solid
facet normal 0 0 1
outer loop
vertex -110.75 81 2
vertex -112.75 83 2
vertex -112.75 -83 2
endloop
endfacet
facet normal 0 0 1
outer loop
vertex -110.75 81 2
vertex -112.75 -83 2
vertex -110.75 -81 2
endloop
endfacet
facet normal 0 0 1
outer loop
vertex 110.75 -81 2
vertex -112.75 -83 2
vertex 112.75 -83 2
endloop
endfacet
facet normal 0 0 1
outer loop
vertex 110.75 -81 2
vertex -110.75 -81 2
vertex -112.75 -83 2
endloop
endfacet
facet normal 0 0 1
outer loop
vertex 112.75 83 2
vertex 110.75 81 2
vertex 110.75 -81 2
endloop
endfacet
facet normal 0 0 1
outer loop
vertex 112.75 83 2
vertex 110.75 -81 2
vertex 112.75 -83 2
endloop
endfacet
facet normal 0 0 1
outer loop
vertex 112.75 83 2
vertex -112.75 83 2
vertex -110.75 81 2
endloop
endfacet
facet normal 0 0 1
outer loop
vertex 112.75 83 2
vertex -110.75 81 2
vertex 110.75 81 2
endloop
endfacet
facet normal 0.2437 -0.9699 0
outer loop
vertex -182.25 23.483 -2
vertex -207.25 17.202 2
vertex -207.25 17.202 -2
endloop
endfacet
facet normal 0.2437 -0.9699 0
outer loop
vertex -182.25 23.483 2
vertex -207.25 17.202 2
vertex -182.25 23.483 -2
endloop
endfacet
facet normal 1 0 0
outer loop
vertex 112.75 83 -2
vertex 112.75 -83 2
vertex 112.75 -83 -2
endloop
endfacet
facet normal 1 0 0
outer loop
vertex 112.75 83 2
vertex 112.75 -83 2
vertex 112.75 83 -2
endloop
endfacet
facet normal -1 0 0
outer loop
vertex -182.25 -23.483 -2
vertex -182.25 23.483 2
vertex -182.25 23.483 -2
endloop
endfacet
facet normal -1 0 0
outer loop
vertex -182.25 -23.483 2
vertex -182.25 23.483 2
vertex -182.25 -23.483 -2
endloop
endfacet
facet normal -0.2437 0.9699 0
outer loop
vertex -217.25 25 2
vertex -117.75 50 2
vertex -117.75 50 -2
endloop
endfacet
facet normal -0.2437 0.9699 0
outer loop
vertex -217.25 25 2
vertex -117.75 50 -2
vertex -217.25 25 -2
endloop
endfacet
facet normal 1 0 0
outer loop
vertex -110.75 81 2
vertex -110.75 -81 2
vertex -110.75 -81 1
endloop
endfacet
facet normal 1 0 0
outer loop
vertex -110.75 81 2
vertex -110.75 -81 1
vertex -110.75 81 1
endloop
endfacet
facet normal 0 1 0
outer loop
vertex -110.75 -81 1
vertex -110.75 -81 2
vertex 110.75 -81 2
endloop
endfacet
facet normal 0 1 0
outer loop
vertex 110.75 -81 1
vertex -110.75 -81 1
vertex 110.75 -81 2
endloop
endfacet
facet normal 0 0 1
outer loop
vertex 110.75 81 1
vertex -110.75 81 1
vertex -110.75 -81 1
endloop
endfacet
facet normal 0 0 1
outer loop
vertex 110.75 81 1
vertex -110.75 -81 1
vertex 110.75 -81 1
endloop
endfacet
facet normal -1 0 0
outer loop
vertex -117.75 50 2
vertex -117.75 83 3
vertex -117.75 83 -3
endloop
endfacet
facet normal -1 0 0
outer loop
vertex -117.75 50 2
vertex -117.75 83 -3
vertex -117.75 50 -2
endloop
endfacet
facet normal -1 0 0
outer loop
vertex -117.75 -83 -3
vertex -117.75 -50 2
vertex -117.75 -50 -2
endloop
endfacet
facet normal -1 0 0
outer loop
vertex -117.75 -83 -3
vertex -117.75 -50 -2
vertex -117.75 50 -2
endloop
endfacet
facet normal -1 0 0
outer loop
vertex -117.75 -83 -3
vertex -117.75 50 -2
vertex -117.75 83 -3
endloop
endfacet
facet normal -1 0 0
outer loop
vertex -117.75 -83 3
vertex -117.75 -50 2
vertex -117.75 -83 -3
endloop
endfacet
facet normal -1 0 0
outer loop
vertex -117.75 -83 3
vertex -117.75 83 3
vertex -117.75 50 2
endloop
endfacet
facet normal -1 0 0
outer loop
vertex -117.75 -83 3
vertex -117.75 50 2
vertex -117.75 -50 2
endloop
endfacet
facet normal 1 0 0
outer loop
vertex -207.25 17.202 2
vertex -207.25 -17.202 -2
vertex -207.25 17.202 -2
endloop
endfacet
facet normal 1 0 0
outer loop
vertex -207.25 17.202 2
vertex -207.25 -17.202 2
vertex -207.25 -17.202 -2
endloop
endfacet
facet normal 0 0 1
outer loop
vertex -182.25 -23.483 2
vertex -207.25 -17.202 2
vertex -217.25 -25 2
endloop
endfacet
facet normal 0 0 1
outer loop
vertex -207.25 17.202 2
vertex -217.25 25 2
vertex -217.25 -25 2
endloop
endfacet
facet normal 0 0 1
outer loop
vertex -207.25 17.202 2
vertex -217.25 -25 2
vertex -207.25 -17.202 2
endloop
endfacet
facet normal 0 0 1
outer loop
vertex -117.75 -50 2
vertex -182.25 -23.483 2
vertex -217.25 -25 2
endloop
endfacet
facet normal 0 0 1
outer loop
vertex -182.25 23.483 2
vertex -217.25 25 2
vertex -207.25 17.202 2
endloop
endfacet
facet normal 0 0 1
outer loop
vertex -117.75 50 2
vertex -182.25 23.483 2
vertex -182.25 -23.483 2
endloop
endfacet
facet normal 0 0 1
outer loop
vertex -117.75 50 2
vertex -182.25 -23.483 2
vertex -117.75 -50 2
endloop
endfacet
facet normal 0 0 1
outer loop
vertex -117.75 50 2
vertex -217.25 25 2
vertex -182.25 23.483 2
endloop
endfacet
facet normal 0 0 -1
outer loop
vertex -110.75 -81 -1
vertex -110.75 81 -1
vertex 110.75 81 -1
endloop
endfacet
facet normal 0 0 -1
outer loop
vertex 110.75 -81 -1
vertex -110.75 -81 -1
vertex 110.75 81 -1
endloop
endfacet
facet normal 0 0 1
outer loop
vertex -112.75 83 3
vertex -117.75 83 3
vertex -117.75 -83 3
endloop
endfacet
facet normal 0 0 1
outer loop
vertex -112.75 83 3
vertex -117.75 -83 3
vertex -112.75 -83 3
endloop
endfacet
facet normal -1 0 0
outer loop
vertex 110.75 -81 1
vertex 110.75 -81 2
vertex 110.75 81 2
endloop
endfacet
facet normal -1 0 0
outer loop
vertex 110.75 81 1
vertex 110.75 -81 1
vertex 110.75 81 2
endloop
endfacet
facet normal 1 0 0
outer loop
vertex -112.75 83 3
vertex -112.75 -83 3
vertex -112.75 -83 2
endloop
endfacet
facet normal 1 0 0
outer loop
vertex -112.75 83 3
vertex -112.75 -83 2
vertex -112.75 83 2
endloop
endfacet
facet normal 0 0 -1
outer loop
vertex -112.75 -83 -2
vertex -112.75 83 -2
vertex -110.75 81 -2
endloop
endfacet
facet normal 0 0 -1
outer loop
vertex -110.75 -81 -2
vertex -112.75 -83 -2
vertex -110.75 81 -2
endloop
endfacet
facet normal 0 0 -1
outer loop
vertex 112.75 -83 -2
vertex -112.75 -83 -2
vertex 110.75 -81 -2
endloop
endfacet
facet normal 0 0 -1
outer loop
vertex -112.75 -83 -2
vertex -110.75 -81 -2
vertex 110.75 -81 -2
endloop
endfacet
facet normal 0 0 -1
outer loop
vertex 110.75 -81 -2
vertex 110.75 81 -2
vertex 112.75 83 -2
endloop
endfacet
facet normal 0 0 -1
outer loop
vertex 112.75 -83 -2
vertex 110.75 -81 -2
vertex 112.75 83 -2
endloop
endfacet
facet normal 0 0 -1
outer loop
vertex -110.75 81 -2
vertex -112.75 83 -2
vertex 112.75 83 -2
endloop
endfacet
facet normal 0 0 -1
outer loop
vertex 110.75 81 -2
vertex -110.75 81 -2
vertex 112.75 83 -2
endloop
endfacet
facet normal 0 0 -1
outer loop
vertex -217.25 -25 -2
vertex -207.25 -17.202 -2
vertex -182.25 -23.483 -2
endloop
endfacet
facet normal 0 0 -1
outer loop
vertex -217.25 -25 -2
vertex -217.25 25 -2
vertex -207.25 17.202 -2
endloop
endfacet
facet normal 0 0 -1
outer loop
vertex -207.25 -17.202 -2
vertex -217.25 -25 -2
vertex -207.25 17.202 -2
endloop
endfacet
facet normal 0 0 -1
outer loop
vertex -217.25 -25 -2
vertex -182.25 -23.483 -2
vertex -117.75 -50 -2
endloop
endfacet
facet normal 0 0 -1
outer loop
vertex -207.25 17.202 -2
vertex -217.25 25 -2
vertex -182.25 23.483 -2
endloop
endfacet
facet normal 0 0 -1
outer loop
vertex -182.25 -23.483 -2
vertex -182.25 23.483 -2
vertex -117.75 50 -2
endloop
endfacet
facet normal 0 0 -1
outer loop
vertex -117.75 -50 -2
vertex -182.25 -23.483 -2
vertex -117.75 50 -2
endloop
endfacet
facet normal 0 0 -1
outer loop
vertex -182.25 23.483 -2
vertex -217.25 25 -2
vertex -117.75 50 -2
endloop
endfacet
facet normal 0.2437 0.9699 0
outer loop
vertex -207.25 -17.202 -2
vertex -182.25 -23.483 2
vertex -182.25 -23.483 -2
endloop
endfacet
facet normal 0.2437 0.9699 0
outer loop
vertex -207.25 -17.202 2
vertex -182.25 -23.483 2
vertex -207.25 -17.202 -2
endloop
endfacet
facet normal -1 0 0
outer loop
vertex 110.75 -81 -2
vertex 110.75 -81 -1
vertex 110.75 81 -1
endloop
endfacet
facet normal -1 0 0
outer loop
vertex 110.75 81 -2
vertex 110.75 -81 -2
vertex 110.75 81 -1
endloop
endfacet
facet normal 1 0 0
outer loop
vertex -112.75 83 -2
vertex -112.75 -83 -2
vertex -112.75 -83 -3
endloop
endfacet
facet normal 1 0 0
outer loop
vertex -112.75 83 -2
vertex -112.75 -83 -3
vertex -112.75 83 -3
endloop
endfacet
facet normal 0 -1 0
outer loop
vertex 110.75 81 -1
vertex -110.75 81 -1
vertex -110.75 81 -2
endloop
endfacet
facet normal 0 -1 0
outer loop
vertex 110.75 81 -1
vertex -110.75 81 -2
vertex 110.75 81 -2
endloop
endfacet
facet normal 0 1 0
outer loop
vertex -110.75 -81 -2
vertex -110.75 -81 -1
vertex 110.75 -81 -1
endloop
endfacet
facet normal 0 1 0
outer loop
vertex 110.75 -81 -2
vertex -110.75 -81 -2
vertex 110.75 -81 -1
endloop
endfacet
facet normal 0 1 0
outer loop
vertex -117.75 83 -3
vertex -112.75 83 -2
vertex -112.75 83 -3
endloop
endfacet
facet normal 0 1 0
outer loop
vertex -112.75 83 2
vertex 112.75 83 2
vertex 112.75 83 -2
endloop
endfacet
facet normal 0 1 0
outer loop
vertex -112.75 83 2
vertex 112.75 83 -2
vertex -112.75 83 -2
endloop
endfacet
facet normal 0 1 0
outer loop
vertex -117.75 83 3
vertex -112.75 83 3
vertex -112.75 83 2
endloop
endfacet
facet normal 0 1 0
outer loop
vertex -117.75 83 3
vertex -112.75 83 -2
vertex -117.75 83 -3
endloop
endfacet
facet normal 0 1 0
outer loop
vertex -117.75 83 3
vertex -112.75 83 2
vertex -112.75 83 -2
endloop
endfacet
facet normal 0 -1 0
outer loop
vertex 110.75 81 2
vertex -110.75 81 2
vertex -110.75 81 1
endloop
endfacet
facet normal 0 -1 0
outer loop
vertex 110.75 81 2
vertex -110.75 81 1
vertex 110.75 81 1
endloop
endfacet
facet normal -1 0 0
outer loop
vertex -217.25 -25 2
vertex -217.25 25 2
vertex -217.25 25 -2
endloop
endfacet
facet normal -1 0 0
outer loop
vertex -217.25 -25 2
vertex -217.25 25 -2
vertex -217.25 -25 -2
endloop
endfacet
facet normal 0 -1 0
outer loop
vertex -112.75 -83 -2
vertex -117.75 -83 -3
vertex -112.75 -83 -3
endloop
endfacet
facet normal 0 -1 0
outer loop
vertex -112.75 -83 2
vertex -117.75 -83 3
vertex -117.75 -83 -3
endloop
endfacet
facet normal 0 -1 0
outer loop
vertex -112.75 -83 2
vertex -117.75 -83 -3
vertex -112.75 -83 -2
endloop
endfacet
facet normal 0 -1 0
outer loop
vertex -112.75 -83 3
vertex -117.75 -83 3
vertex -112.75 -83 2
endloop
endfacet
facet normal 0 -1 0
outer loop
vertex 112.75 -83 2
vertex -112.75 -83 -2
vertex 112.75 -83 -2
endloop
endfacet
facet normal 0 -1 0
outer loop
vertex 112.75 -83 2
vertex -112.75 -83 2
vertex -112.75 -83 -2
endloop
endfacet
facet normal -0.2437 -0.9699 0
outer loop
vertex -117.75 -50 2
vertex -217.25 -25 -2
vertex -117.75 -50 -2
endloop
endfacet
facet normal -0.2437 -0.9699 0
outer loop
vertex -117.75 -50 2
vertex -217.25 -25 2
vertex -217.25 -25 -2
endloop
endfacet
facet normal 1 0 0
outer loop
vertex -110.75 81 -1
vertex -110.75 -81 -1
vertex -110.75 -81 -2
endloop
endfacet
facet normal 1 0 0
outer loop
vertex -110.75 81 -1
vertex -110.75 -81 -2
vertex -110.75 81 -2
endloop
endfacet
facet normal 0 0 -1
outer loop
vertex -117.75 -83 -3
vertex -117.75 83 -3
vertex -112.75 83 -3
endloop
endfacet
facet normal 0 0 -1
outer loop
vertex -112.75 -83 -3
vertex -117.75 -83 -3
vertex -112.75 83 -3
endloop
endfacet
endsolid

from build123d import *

# Parameters (mm, degrees)
F0_W     = 221.5
F0_H     = 162
F1_DEPTH = 1
F0_W_2   = 225.5
F0_H_2   = 166
F2_DEPTH = 2
F3_DEPTH = 3
F4_DEPTH = 2


with BuildPart() as f1:
    # F0 (on Top) → F1 (new body, symmetric)
    with BuildSketch(Plane.XY):
        Rectangle(F0_W, F0_H)
    extrude(amount=F1_DEPTH, both=True)

    # F0 (on Top) → F2 (join, symmetric)
    with BuildSketch(Plane.XY):
        Rectangle(F0_W_2, F0_H_2)
        Rectangle(F0_W, F0_H, mode=Mode.SUBTRACT)
    extrude(amount=F2_DEPTH, both=True)

    # F0 (on Top) → F3 (join, symmetric)
    with BuildSketch(Plane.XY):
        Polygon((-112.75, -83), (-112.75, 83), (-117.75, 83), (-117.75, 50), (-117.75, -50), (-117.75, -83), align=None)
    extrude(amount=F3_DEPTH, both=True)

    # F0 (on Top) → F4 (join, symmetric)
    with BuildSketch(Plane.XY):
        Polygon((-117.75, -50), (-117.75, 50), (-217.25, 25), (-217.25, -25), align=None)
        Polygon((-182.25, -23.483152), (-207.25, -17.201745), (-207.25, 17.201745), (-182.25, 23.483152), align=None, mode=Mode.SUBTRACT)
    extrude(amount=F4_DEPTH, both=True)


solid = f1.part
